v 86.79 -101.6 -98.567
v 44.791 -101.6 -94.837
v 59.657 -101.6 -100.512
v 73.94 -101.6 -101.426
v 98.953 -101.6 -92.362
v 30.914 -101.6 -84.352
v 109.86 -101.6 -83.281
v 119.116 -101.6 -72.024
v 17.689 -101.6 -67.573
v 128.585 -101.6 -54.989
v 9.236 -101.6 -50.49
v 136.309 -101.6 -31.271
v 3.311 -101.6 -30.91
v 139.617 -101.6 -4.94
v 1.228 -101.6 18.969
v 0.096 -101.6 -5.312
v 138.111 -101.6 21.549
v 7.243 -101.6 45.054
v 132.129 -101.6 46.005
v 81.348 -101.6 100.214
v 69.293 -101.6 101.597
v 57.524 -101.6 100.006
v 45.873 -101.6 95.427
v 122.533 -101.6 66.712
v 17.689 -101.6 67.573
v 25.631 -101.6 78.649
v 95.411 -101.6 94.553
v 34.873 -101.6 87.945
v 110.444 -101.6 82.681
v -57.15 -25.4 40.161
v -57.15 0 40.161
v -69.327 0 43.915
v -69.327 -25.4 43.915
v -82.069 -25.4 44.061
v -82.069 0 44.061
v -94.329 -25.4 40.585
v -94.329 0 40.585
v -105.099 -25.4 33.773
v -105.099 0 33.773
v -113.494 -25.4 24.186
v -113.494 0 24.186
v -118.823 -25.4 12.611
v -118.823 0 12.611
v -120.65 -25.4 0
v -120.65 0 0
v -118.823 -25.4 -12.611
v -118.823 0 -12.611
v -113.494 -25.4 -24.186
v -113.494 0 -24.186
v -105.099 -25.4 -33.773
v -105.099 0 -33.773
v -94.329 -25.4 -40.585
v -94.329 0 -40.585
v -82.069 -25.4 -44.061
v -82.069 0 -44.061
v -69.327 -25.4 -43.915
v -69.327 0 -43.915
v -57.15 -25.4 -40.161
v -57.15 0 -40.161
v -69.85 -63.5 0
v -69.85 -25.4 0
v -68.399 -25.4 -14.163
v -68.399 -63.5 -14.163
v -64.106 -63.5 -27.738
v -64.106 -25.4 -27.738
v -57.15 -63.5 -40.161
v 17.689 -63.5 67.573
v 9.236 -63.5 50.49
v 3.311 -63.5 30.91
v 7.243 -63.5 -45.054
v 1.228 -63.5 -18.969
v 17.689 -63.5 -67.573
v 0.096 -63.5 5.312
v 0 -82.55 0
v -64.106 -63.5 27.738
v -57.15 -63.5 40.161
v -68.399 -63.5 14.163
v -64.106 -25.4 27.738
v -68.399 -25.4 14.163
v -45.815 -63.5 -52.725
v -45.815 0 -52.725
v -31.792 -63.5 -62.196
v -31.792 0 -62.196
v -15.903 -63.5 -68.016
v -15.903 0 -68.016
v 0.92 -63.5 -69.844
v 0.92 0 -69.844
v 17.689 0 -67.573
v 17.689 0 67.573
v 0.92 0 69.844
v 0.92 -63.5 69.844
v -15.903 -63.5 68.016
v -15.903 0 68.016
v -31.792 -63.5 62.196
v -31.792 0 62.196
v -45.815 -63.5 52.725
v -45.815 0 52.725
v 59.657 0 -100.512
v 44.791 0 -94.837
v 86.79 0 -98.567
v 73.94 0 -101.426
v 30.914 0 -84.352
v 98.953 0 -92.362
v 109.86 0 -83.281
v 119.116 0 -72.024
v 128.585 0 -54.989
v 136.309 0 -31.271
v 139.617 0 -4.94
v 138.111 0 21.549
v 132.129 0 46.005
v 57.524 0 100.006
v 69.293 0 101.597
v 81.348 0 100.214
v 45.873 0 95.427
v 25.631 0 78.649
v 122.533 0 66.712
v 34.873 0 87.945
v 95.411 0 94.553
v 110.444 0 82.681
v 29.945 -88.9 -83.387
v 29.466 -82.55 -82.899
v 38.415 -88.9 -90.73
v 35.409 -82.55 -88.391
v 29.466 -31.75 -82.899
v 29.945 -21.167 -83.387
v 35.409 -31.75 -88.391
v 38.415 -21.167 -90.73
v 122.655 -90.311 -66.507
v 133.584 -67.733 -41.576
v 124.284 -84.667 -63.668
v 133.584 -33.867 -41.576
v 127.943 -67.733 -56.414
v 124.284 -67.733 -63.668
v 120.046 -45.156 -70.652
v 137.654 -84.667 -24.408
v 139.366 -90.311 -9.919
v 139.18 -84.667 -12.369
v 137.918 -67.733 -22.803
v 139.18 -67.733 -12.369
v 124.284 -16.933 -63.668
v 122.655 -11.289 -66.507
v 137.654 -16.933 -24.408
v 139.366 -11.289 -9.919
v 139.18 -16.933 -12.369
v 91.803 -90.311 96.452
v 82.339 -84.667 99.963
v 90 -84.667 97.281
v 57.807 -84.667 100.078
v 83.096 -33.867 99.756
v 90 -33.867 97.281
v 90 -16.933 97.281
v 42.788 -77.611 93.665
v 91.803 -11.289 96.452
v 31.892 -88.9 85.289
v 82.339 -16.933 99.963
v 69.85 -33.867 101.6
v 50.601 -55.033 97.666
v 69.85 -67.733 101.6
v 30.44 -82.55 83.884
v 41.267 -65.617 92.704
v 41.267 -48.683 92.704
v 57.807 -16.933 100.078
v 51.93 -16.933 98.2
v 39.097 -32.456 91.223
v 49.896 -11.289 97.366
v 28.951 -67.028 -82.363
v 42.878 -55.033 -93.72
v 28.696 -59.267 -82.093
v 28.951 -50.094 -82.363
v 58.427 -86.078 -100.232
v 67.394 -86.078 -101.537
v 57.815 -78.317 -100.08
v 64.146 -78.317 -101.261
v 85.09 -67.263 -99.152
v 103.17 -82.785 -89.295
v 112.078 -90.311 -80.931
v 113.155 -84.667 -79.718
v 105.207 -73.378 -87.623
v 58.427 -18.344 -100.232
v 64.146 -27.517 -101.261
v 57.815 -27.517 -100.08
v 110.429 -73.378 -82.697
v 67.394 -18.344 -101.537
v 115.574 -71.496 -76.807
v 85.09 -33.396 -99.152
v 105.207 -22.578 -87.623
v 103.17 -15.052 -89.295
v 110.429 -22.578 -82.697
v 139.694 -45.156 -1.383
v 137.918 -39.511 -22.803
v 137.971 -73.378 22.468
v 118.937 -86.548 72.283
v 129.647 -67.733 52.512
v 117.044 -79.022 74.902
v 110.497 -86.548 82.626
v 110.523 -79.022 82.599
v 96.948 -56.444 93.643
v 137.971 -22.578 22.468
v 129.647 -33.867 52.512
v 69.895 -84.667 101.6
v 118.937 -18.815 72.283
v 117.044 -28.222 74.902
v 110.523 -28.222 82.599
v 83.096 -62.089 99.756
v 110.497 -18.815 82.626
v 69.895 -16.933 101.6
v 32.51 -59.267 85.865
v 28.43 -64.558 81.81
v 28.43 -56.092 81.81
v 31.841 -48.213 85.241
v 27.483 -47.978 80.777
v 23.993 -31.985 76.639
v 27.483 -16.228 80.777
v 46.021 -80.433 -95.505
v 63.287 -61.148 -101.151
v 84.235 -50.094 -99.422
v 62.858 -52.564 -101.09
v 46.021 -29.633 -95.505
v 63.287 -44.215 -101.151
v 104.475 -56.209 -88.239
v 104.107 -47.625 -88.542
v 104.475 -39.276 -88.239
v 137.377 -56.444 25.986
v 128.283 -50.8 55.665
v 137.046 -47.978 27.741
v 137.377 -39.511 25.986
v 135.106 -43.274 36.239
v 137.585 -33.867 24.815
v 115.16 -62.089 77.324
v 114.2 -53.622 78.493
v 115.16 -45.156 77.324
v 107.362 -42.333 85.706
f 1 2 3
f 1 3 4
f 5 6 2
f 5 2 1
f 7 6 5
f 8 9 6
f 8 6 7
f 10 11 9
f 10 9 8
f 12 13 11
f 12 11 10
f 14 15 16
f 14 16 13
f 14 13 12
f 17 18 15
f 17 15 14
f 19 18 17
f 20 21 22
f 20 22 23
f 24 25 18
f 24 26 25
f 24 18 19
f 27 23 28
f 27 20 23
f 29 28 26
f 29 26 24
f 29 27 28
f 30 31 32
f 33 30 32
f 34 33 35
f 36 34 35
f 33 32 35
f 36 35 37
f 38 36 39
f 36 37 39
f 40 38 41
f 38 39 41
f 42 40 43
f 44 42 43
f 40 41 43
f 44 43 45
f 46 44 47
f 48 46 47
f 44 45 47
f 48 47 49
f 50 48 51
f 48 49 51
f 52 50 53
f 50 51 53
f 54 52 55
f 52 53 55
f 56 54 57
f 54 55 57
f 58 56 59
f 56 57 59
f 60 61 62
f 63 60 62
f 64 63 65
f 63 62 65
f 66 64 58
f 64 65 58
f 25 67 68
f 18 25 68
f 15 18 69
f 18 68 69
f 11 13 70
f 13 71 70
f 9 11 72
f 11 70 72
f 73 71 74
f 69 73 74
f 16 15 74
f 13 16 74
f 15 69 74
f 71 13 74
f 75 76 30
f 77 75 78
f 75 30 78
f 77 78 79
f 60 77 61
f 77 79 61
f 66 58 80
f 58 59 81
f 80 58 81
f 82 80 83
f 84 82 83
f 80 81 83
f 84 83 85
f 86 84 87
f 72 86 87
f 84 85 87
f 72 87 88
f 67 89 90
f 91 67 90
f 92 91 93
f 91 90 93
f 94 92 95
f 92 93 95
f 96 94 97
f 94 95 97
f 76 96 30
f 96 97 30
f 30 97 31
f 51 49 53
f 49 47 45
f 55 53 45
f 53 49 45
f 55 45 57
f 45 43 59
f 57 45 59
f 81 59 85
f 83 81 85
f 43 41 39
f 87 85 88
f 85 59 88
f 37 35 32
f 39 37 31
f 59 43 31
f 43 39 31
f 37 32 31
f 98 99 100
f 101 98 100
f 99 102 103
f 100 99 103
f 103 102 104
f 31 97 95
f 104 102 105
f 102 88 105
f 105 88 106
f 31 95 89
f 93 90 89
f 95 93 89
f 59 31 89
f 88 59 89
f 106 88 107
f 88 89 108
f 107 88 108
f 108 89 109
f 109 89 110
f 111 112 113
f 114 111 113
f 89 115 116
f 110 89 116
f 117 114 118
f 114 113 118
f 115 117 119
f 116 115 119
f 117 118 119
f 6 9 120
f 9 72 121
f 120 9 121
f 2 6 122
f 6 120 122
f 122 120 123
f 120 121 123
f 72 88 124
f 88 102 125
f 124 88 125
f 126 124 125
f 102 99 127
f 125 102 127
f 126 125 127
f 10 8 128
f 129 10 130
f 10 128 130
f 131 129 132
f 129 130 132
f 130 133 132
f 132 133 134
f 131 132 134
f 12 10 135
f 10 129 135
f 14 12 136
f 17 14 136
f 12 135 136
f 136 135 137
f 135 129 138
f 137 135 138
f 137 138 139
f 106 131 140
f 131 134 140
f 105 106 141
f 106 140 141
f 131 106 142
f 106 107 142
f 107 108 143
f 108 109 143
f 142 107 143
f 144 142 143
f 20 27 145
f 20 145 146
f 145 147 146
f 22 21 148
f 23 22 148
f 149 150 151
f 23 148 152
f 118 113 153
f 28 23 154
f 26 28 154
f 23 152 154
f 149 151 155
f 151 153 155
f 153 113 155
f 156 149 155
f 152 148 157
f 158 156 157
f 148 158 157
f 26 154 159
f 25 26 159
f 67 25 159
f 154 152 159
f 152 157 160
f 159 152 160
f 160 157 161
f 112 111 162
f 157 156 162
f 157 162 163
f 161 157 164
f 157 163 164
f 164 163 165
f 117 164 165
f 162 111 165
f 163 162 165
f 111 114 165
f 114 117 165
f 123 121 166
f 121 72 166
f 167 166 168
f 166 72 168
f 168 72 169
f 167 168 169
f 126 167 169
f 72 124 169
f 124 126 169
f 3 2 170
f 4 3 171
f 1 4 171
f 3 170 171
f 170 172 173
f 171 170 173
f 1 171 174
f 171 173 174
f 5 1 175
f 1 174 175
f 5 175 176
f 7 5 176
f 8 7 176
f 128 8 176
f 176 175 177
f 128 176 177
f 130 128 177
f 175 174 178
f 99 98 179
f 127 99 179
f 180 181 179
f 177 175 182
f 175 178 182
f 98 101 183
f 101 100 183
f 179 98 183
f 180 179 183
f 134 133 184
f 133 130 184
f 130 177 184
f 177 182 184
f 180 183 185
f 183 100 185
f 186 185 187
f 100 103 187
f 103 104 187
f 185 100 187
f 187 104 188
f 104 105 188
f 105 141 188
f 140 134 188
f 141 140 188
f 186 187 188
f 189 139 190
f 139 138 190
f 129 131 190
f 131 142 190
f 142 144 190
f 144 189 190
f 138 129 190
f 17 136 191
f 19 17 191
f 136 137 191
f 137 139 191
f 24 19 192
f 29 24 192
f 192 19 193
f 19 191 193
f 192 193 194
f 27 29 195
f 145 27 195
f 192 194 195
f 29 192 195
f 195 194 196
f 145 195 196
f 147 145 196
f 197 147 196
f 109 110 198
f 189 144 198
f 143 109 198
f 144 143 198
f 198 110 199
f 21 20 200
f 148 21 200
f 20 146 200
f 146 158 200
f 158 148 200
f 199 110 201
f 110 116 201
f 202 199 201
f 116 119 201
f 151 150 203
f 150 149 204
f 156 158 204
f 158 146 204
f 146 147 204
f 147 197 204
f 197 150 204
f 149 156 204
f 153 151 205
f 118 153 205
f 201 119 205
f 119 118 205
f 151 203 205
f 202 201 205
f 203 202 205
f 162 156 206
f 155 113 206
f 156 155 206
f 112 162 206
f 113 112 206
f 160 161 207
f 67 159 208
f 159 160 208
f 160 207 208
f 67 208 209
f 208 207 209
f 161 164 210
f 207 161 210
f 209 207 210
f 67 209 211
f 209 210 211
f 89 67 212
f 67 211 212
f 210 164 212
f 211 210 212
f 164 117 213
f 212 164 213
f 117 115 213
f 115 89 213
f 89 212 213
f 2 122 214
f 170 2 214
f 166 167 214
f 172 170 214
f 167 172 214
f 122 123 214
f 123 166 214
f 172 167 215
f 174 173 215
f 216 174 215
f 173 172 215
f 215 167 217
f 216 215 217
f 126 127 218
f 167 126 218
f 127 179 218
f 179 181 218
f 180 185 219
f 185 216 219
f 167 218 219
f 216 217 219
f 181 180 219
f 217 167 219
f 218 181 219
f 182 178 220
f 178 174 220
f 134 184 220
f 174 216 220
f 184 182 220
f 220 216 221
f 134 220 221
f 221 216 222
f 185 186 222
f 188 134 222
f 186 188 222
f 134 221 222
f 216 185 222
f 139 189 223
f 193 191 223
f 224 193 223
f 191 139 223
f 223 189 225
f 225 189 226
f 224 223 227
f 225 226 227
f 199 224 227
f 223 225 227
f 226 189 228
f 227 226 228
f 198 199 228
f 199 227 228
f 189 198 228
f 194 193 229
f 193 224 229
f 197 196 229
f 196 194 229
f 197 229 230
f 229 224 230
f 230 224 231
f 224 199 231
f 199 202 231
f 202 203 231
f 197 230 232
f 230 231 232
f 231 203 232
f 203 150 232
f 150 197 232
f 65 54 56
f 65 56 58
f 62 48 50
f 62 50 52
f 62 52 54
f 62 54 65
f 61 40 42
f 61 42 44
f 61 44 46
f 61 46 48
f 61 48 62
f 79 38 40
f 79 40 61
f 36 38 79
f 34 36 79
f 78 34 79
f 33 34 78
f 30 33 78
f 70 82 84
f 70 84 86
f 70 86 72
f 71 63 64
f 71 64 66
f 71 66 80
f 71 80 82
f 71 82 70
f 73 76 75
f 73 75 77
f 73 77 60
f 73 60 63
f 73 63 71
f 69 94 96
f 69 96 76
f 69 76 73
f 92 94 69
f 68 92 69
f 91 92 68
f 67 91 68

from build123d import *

# Parameters (mm, degrees)
F1_DEPTH = 25.4
F2_DEPTH = 63.5
F3_DEPTH = 101.6


with BuildPart() as f1:
    # F0 (on Front) → F1 (new body)
    with BuildSketch(Plane.XZ):
        with BuildLine():
            ThreePointArc((-57.15, -40.1609262841), (-66.5993618588, -21.0605674188), (-69.85, 0))
            ThreePointArc((-69.85, 0), (-66.5993618588, 21.0605674188), (-57.15, 40.1609262841))
            ThreePointArc((-57.15, 40.1609262841), (-120.65, 0), (-57.15, -40.1609262841))
        make_face()
    extrude(amount=F1_DEPTH)

    # F0 (on Front) → F2 (join)
    with BuildSketch(Plane.XZ):
        with BuildLine():
            ThreePointArc((-57.15, 40.1609262841), (-66.5993618588, 21.0605674188), (-69.85, 0))
            Line((-69.85, 0), (-31.75, 0))
            ThreePointArc((-31.75, 0), (-38.6328933773, 23.759524406), (-57.15, 40.1609262841))
        make_face()
        with BuildLine():
            Line((-31.75, 0), (-69.85, 0))
            ThreePointArc((-69.85, 0), (-66.5993618588, -21.0605674188), (-57.15, -40.1609262841))
            ThreePointArc((-57.15, -40.1609262841), (-38.6328933773, -23.759524406), (-31.75, 0))
        make_face()
        with BuildLine():
            Line((0, 0), (-31.75, 0))
            ThreePointArc((-31.75, 0), (-38.6328933773, -23.759524406), (-57.15, -40.1609262841))
            ThreePointArc((-57.15, -40.1609262841), (-24.0241172905, -65.5885987685), (17.6886151651, -67.5731854624))
            add(Edge.make_bspline(
                [(0, 0), (0, -38.6848080688), (17.6886151651, -67.5731854624)],
                knots=[1.5707963268, 1.5707963268, 1.5707963268, 2.2984112049, 2.2984112049, 2.2984112049], degree=2, weights=[1, 0.9345487806, 1]))
        make_face()
        with BuildLine():
            ThreePointArc((-57.15, 40.1609262841), (-38.6328933773, 23.759524406), (-31.75, 0))
            Line((-31.75, 0), (0, 0))
            add(Edge.make_bspline(
                [(17.6886151651, 67.5731854624), (0, 38.6848080688), (0, 0)],
                knots=[0.8431814486, 0.8431814486, 0.8431814486, 1.5707963268, 1.5707963268, 1.5707963268], degree=2, weights=[1, 0.9345487806, 1]))
            ThreePointArc((17.6886151651, 67.5731854624), (-24.0241172905, 65.5885987685), (-57.15, 40.1609262841))
        make_face()
    extrude(amount=F2_DEPTH)

    # F0 (on Front) → F3 (join)
    with BuildSketch(Plane.XZ):
        with BuildLine():
            add(Edge.make_bspline(
                [(17.6886151651, 67.5731854624), (0, 38.6848080688), (0, 0)],
                knots=[0.8431814486, 0.8431814486, 0.8431814486, 1.5707963268, 1.5707963268, 1.5707963268], degree=2, weights=[1, 0.9345487806, 1]))
            add(Edge.make_bspline(
                [(0, 0), (0, -38.6848080688), (17.6886151651, -67.5731854624)],
                knots=[1.5707963268, 1.5707963268, 1.5707963268, 2.2984112049, 2.2984112049, 2.2984112049], degree=2, weights=[1, 0.9345487806, 1]))
            ThreePointArc((17.6886151651, -67.5731854624), (55.2927313002, -42.6818036798), (69.85, 0))
            ThreePointArc((69.85, 0), (55.2927313002, 42.6818036798), (17.6886151651, 67.5731854624))
        make_face()
        with BuildLine():
            add(Edge.make_bspline(
                [(69.85, 101.6), (38.5235419402, 101.6), (17.6886151651, 67.5731854624)],
                knots=[0, 0, 0, 0.8431814486, 0.8431814486, 0.8431814486], degree=2, weights=[1, 0.9124391509, 1]))
            ThreePointArc((17.6886151651, 67.5731854624), (55.2927313002, 42.6818036798), (69.85, 0))
            Line((69.85, 0), (69.85, 101.6))
        make_face()
        with BuildLine():
            ThreePointArc((69.85, 0), (55.2927313002, -42.6818036798), (17.6886151651, -67.5731854624))
            add(Edge.make_bspline(
                [(17.6886151651, -67.5731854624), (89.4382412502, -184.7519615766), (133.5838746885, -41.5759807883), (177.7295081268, 101.6), (69.85, 101.6)],
                knots=[2.2984112049, 2.2984112049, 2.2984112049, 4.2907982561, 4.2907982561, 6.2831853072, 6.2831853072, 6.2831853072], degree=2, weights=[1, 0.5435014216, 1, 0.5435014216, 1]))
            Line((69.85, 101.6), (69.85, 0))
        make_face()
    extrude(amount=F3_DEPTH)


solid = f1.part
